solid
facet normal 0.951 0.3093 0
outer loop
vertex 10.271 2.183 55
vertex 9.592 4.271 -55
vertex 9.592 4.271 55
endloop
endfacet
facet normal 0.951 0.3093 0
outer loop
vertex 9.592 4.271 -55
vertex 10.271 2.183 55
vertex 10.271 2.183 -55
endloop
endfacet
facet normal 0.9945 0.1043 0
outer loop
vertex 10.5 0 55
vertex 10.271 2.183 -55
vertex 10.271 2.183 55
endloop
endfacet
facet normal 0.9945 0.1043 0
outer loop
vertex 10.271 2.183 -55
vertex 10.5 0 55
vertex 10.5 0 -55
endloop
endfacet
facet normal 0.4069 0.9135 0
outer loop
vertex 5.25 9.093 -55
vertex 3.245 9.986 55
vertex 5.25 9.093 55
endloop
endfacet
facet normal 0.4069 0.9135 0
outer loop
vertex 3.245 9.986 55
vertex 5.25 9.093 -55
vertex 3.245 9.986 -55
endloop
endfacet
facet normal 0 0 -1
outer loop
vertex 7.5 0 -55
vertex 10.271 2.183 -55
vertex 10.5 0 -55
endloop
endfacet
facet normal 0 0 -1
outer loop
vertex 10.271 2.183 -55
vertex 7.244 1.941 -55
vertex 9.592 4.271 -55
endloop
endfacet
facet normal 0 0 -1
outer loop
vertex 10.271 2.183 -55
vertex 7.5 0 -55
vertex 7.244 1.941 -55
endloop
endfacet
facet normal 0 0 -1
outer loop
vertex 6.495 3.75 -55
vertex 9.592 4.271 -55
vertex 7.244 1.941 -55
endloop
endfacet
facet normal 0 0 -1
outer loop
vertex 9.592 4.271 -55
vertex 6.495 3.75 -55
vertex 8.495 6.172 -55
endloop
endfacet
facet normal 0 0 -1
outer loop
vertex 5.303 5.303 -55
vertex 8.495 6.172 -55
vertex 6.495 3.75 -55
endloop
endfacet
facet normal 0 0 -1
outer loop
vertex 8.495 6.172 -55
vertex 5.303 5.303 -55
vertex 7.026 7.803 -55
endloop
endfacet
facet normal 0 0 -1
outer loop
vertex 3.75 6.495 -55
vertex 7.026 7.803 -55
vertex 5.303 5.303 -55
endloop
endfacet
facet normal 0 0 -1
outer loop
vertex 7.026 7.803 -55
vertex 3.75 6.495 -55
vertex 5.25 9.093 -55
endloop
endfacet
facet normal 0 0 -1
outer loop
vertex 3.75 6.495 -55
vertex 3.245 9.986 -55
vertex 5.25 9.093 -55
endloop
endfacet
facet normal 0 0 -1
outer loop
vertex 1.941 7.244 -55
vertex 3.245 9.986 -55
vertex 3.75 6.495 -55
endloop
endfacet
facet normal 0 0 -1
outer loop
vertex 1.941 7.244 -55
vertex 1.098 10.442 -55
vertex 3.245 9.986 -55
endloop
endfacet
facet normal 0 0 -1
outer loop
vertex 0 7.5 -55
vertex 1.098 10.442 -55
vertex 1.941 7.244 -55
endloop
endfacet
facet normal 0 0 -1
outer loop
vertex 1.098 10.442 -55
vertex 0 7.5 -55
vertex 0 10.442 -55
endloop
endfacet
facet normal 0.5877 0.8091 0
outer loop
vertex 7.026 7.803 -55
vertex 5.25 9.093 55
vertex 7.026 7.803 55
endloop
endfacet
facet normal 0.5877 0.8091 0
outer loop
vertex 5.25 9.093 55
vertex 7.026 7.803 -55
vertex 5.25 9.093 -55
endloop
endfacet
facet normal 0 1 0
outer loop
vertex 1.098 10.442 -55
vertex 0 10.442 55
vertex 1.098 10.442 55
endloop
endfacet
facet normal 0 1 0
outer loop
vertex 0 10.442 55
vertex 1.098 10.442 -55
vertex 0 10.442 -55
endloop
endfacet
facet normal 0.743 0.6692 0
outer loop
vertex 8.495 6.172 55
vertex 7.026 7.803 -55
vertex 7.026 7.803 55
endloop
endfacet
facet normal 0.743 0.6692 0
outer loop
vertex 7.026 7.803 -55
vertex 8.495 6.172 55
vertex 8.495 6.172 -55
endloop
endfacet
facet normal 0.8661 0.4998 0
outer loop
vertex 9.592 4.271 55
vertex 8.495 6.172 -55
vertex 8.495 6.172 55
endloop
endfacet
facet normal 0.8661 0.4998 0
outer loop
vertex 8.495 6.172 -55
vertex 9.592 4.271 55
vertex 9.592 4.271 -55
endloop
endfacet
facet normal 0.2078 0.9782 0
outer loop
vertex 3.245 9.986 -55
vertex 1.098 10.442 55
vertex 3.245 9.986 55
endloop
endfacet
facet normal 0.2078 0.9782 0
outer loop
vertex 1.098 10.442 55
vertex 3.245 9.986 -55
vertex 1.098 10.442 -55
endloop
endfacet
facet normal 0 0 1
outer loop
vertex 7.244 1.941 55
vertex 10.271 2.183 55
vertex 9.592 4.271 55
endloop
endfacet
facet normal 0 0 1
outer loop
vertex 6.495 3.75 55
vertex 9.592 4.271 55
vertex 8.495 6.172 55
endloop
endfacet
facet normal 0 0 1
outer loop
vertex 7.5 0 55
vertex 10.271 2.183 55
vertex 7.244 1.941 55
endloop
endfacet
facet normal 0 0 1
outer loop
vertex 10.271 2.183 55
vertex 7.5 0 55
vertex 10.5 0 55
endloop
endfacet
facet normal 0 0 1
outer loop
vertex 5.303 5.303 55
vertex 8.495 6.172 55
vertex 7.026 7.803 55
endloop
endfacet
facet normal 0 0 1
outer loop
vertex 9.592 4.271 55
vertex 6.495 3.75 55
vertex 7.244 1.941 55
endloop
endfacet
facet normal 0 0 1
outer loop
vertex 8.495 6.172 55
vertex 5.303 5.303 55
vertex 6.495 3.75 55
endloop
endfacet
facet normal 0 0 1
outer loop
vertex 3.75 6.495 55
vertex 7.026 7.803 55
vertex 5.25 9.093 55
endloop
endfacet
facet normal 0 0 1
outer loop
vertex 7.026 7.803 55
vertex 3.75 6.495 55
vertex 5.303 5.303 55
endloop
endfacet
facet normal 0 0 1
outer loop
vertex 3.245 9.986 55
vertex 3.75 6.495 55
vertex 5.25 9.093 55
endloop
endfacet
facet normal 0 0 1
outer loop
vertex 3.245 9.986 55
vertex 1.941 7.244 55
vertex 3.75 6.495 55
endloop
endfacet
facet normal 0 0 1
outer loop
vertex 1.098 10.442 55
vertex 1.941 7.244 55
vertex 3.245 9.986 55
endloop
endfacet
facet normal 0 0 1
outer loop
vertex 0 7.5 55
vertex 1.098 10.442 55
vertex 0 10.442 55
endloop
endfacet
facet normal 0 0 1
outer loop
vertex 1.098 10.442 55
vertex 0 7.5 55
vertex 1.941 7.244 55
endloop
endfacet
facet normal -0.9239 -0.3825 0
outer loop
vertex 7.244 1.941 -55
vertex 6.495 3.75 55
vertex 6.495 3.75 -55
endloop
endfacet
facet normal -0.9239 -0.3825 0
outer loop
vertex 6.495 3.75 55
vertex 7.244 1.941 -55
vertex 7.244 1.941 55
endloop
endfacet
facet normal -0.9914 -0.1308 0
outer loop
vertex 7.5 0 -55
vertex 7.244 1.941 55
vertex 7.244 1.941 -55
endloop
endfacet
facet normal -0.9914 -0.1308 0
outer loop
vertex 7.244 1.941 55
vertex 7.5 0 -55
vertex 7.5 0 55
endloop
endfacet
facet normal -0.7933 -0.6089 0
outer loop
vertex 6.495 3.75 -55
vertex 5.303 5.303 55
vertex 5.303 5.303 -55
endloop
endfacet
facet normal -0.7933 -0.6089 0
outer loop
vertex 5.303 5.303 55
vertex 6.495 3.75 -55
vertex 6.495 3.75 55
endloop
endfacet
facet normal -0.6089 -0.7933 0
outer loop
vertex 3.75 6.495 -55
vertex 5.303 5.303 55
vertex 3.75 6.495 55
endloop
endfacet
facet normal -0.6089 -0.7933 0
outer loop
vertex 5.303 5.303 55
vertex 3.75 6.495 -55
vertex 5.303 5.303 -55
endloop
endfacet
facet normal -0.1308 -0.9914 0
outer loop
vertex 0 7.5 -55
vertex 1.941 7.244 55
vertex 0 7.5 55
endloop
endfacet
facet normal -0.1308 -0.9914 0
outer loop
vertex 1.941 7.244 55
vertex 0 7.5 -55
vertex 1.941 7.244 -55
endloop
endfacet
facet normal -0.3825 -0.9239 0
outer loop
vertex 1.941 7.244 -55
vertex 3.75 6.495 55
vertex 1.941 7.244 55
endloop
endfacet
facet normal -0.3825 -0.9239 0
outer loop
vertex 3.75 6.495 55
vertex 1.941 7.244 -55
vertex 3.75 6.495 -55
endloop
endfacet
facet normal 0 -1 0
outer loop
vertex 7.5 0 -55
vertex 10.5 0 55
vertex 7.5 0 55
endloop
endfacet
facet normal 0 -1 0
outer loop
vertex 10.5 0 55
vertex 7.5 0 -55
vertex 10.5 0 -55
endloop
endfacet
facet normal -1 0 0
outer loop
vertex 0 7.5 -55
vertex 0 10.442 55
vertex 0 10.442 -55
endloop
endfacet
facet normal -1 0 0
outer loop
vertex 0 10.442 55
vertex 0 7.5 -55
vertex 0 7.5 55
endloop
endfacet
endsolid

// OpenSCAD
// file: cutting_wedge.scad
// Library: cutting_wedge.scad
// Version: 1.0.0
// Author: David Bowers
// Copyright: 2022
// License: 2-clause BSD License (http://opensource.org/licenses/BSD-2-Clause)

// Will produce a wedge to be used with difference();
// cutting_wedge(angle:int, outside:int, height:int); 


module cutting_wedge(angle=90, outside=21, height=110){
    cutters = [outside*2,outside,height+0.5];
    echo (angle);
    difference(){
        cylinder(h=height,d=outside,center=true);
        rotate([0,0,angle])
        translate([outside,outside/2,-0.1])
        cube(cutters,center=true);
        translate([0,-outside/2,-0.1])
        cube(cutters,center=true);
    }
}

cutting_wedge();
// file: tube.scad
// Library: tube.scad
// Version: 1.0.0
// Author: David Bowers
// Copyright: 2022
// License: 2-clause BSD License (http://opensource.org/licenses/BSD-2-Clause)

// tube(outside:int, inside:int, height:int); 


module tube(outside, inside, height){
    difference(){
        cylinder(h=height,d=outside,center=true);
        cylinder(h=height+0.1,d=inside, center=true);
    }
}
// main file
// Library: cup.scad
// Version: 1.0.0
// Author: David Bowers
// Copyright: 2022
// License: 2-clause BSD License (http://opensource.org/licenses/BSD-2-Clause)

// cup(angle:int, inside:int, thickness:int, height:int); 
//   Made to export a 3D printable stl file from.abs

// EXAMPLE USAGE:
// cup(
//    angle:int
//        The angle to which the arc will extend. 
//    inside:int
//        The diameter of the inside circle. 
//    thickness:int 
//        The thickness of the arc. 
//    height:int
//        The height of the cup. 
//  );
//   

use <./tube.scad>;
use <./cutting_wedge.scad>;
 

module cup(angle=90, inside=15, thickness=3, height=110) {
    // a cup is an arc line with thickness. 
    outside=inside+thickness*2;
    intersection(){
        tube(outside, inside, height);
        cutting_wedge(angle, outside, height);
    }
}

cup();
